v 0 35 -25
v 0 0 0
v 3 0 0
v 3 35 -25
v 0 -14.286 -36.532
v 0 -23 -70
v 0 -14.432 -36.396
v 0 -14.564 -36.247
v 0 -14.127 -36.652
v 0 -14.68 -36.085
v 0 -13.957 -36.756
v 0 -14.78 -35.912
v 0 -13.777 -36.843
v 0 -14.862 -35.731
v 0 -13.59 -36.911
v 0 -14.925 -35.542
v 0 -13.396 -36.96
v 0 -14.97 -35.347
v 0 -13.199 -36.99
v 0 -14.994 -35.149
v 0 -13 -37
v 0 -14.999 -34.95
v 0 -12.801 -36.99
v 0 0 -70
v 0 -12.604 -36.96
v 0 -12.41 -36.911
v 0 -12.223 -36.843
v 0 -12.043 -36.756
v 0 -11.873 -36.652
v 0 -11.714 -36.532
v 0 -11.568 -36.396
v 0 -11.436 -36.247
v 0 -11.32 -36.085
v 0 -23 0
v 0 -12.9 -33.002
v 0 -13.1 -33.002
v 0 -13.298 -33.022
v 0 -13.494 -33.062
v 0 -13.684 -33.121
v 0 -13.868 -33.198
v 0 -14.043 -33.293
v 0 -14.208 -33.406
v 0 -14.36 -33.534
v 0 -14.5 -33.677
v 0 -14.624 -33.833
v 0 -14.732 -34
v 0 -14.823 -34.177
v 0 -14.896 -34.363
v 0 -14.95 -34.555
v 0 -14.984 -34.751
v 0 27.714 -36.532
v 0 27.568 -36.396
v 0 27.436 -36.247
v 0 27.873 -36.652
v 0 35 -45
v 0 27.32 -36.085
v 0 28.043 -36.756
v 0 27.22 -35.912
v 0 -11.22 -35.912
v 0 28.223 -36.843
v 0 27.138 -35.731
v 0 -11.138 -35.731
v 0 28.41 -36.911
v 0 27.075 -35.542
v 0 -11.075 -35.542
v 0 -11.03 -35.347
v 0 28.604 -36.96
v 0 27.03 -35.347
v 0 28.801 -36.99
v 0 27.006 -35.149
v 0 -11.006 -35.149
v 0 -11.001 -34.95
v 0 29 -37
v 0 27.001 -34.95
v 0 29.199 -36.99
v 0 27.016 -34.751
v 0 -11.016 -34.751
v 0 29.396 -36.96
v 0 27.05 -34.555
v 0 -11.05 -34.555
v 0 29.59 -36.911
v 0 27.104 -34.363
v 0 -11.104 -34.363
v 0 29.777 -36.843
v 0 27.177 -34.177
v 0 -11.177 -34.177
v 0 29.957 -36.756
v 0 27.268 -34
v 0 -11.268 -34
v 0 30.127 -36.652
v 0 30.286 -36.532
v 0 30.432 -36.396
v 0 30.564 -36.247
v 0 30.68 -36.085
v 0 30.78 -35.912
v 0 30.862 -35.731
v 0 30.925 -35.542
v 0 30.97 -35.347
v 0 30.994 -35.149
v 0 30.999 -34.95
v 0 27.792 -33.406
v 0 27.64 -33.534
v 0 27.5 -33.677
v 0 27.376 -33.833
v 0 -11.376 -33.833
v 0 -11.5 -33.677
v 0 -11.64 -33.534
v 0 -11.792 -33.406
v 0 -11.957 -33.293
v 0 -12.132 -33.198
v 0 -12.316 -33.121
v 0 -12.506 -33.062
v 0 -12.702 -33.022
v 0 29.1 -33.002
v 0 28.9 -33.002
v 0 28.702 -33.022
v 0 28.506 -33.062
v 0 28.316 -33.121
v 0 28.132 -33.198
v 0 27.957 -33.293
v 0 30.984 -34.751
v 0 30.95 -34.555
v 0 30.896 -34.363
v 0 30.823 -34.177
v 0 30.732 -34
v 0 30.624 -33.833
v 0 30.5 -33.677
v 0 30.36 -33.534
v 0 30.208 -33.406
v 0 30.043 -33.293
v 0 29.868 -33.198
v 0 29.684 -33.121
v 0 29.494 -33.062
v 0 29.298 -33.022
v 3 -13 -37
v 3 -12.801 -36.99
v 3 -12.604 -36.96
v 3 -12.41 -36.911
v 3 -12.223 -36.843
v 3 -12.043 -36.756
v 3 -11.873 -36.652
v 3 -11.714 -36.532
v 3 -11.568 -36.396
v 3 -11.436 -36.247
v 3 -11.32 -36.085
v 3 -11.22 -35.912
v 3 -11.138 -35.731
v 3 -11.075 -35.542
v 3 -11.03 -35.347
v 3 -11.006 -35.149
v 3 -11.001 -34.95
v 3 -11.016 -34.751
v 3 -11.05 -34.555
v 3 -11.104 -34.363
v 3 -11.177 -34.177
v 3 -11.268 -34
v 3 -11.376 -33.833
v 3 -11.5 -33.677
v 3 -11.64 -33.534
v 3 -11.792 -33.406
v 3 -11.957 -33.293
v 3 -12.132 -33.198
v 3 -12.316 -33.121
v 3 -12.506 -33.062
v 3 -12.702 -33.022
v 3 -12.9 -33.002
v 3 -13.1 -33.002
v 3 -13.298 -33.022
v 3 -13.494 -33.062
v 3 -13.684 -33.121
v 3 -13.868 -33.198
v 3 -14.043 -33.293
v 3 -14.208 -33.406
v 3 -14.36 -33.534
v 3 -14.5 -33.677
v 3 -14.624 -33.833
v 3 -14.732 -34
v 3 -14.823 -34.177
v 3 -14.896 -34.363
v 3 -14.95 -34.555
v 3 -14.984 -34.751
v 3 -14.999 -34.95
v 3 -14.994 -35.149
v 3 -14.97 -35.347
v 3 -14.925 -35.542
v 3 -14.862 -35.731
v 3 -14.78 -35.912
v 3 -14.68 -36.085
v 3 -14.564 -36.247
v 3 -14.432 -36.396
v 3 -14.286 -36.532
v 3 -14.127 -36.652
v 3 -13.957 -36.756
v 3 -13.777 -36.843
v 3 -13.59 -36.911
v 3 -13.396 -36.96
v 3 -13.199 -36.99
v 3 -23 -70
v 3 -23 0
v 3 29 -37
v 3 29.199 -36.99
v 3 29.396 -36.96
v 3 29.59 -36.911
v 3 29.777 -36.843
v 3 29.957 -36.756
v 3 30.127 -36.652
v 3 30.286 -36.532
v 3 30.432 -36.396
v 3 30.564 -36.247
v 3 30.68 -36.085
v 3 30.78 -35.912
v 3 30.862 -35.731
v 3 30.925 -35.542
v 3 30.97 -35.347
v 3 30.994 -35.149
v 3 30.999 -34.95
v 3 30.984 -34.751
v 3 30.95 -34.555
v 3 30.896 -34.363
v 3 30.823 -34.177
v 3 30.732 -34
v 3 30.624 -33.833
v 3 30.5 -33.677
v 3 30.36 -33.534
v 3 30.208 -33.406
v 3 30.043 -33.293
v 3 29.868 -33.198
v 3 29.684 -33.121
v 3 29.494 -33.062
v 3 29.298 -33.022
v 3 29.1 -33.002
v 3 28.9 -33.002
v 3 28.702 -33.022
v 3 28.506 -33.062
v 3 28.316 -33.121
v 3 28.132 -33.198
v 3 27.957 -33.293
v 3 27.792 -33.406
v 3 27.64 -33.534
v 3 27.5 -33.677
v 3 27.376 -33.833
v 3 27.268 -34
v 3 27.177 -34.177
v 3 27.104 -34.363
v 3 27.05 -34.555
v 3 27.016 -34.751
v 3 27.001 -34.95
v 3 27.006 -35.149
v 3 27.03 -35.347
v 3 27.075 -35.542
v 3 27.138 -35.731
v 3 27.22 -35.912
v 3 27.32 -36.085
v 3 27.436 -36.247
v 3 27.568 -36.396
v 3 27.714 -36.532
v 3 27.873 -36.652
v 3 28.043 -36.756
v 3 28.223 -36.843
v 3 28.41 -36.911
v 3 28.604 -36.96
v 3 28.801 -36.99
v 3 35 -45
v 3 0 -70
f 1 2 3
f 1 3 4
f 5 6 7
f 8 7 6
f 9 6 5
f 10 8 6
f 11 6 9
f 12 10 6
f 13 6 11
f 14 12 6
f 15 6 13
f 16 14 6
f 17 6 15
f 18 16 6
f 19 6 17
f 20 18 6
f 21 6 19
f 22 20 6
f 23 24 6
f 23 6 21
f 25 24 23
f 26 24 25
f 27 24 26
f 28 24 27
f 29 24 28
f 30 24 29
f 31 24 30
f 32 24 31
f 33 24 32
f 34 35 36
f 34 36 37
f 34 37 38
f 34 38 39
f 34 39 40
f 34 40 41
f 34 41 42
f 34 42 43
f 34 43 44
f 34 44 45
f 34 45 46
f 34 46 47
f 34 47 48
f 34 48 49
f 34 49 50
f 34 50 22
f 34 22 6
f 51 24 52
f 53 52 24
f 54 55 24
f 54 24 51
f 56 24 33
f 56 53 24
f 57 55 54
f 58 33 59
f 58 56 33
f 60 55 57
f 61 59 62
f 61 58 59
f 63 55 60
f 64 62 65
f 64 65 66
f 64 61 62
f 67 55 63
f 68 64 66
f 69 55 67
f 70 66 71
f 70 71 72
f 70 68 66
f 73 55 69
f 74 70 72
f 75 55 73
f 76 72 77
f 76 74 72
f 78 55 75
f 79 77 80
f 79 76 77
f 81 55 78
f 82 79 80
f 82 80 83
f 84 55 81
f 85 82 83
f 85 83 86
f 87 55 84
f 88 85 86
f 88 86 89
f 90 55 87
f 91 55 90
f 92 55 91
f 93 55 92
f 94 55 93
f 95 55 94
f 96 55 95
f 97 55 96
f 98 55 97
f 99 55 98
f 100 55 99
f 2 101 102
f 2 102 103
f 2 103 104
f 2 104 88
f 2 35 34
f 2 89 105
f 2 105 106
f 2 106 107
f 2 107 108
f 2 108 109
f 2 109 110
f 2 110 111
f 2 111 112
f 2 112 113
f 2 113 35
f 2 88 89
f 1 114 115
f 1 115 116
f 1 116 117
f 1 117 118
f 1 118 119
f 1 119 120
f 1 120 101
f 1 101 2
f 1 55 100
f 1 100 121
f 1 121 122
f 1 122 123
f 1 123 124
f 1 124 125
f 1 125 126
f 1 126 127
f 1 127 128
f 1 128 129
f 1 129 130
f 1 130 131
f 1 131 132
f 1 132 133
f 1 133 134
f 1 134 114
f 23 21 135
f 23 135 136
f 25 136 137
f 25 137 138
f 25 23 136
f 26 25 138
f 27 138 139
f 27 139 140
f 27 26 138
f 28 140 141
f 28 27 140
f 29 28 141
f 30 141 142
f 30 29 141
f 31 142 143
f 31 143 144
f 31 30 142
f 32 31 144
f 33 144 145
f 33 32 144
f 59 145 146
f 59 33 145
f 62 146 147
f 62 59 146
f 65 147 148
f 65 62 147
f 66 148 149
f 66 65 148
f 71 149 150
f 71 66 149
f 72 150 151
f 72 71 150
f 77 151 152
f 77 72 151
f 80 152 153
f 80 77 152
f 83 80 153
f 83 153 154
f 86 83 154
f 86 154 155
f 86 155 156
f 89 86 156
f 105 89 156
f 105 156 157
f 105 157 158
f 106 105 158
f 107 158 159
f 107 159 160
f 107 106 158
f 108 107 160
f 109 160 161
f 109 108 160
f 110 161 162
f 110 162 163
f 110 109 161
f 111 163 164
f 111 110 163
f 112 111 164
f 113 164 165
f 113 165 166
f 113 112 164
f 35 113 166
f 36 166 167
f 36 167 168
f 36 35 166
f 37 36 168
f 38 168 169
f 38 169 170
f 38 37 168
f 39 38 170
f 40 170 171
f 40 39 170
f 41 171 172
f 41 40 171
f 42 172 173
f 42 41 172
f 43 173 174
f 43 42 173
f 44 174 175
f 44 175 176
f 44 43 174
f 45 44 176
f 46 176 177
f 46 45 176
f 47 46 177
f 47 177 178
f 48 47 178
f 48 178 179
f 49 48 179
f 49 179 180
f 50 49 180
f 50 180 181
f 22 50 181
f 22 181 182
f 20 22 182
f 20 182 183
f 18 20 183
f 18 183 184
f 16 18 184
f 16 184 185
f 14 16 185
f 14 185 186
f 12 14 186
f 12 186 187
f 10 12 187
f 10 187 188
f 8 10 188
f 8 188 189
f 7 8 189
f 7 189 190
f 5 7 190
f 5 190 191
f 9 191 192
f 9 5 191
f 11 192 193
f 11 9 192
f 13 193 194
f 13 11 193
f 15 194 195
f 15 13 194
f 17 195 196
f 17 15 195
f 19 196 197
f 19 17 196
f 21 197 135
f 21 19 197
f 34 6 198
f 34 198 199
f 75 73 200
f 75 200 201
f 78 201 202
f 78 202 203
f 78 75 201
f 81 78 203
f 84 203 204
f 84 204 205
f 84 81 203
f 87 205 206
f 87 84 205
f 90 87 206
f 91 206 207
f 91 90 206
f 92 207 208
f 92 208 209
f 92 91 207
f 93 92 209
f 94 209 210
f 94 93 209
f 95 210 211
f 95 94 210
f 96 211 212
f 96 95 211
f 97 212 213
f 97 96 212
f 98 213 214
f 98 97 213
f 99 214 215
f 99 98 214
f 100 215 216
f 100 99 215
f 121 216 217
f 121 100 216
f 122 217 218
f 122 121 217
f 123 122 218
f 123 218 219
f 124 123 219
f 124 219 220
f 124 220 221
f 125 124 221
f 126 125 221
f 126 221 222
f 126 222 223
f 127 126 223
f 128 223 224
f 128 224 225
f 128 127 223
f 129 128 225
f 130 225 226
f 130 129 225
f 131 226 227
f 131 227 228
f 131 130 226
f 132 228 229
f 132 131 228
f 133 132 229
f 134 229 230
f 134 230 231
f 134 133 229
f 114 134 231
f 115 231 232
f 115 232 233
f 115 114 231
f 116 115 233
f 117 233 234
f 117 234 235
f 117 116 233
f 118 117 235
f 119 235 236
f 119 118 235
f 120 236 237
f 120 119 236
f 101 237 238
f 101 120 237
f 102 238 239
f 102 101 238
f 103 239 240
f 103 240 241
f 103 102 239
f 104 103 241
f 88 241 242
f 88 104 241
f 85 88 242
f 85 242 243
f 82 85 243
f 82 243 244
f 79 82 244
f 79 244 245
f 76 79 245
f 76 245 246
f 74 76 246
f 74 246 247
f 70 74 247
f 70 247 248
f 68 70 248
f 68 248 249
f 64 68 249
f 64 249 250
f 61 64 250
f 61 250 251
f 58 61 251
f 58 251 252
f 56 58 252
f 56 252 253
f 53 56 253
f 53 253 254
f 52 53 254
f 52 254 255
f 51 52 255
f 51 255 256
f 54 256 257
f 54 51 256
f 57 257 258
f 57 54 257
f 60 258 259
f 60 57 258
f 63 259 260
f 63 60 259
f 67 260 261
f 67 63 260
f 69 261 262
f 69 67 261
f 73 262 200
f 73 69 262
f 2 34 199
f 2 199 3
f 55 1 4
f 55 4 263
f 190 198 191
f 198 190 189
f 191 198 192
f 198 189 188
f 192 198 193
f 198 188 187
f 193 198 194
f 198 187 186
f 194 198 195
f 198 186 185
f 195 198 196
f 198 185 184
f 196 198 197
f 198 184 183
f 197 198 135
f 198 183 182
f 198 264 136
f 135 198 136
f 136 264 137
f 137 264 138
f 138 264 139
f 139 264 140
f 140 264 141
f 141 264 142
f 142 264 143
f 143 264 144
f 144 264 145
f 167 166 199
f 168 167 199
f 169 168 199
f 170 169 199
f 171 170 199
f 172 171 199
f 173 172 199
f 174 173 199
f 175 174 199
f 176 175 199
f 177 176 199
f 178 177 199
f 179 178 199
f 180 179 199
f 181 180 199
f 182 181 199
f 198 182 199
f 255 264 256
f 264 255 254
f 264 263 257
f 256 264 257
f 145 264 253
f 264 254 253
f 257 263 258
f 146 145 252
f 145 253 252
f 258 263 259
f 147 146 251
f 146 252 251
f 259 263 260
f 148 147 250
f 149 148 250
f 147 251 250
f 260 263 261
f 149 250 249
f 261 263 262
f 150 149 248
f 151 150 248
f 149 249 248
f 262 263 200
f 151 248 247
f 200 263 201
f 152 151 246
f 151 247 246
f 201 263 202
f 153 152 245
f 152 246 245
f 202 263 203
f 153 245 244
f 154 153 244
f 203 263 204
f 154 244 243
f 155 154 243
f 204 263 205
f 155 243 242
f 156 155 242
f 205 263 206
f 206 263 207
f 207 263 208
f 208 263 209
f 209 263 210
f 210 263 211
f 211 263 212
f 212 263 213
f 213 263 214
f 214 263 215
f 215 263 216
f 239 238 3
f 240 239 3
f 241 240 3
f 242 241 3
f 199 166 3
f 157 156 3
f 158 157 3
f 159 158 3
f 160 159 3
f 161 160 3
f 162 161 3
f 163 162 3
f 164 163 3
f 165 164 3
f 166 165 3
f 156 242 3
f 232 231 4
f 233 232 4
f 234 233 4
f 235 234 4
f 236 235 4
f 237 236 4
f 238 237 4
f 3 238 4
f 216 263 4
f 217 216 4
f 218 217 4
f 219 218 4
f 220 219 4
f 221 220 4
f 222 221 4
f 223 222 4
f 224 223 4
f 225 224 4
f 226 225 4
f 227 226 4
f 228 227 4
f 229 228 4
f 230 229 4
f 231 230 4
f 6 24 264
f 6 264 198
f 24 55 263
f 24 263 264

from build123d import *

# Parameters (mm, degrees)
SKETCH1_R           = 2
BOSS_EXTRUDE1_DEPTH = 3


with BuildPart() as part:
    # Sketch1 → Boss-Extrude1 (new body)
    with BuildSketch(Plane(origin=(0, 0, 0), x_dir=(0, 0, -1), z_dir=(1, 0, 0))):
        Polygon((0, 0), (25, 35), (45, 35), (70, 0), (70, -23), (0, -23), align=None)
        with Locations((35, -13)):
            Circle(SKETCH1_R, mode=Mode.SUBTRACT)
        with Locations((35, 29)):
            Circle(SKETCH1_R, mode=Mode.SUBTRACT)
    extrude(amount=BOSS_EXTRUDE1_DEPTH)


solid = part.part
